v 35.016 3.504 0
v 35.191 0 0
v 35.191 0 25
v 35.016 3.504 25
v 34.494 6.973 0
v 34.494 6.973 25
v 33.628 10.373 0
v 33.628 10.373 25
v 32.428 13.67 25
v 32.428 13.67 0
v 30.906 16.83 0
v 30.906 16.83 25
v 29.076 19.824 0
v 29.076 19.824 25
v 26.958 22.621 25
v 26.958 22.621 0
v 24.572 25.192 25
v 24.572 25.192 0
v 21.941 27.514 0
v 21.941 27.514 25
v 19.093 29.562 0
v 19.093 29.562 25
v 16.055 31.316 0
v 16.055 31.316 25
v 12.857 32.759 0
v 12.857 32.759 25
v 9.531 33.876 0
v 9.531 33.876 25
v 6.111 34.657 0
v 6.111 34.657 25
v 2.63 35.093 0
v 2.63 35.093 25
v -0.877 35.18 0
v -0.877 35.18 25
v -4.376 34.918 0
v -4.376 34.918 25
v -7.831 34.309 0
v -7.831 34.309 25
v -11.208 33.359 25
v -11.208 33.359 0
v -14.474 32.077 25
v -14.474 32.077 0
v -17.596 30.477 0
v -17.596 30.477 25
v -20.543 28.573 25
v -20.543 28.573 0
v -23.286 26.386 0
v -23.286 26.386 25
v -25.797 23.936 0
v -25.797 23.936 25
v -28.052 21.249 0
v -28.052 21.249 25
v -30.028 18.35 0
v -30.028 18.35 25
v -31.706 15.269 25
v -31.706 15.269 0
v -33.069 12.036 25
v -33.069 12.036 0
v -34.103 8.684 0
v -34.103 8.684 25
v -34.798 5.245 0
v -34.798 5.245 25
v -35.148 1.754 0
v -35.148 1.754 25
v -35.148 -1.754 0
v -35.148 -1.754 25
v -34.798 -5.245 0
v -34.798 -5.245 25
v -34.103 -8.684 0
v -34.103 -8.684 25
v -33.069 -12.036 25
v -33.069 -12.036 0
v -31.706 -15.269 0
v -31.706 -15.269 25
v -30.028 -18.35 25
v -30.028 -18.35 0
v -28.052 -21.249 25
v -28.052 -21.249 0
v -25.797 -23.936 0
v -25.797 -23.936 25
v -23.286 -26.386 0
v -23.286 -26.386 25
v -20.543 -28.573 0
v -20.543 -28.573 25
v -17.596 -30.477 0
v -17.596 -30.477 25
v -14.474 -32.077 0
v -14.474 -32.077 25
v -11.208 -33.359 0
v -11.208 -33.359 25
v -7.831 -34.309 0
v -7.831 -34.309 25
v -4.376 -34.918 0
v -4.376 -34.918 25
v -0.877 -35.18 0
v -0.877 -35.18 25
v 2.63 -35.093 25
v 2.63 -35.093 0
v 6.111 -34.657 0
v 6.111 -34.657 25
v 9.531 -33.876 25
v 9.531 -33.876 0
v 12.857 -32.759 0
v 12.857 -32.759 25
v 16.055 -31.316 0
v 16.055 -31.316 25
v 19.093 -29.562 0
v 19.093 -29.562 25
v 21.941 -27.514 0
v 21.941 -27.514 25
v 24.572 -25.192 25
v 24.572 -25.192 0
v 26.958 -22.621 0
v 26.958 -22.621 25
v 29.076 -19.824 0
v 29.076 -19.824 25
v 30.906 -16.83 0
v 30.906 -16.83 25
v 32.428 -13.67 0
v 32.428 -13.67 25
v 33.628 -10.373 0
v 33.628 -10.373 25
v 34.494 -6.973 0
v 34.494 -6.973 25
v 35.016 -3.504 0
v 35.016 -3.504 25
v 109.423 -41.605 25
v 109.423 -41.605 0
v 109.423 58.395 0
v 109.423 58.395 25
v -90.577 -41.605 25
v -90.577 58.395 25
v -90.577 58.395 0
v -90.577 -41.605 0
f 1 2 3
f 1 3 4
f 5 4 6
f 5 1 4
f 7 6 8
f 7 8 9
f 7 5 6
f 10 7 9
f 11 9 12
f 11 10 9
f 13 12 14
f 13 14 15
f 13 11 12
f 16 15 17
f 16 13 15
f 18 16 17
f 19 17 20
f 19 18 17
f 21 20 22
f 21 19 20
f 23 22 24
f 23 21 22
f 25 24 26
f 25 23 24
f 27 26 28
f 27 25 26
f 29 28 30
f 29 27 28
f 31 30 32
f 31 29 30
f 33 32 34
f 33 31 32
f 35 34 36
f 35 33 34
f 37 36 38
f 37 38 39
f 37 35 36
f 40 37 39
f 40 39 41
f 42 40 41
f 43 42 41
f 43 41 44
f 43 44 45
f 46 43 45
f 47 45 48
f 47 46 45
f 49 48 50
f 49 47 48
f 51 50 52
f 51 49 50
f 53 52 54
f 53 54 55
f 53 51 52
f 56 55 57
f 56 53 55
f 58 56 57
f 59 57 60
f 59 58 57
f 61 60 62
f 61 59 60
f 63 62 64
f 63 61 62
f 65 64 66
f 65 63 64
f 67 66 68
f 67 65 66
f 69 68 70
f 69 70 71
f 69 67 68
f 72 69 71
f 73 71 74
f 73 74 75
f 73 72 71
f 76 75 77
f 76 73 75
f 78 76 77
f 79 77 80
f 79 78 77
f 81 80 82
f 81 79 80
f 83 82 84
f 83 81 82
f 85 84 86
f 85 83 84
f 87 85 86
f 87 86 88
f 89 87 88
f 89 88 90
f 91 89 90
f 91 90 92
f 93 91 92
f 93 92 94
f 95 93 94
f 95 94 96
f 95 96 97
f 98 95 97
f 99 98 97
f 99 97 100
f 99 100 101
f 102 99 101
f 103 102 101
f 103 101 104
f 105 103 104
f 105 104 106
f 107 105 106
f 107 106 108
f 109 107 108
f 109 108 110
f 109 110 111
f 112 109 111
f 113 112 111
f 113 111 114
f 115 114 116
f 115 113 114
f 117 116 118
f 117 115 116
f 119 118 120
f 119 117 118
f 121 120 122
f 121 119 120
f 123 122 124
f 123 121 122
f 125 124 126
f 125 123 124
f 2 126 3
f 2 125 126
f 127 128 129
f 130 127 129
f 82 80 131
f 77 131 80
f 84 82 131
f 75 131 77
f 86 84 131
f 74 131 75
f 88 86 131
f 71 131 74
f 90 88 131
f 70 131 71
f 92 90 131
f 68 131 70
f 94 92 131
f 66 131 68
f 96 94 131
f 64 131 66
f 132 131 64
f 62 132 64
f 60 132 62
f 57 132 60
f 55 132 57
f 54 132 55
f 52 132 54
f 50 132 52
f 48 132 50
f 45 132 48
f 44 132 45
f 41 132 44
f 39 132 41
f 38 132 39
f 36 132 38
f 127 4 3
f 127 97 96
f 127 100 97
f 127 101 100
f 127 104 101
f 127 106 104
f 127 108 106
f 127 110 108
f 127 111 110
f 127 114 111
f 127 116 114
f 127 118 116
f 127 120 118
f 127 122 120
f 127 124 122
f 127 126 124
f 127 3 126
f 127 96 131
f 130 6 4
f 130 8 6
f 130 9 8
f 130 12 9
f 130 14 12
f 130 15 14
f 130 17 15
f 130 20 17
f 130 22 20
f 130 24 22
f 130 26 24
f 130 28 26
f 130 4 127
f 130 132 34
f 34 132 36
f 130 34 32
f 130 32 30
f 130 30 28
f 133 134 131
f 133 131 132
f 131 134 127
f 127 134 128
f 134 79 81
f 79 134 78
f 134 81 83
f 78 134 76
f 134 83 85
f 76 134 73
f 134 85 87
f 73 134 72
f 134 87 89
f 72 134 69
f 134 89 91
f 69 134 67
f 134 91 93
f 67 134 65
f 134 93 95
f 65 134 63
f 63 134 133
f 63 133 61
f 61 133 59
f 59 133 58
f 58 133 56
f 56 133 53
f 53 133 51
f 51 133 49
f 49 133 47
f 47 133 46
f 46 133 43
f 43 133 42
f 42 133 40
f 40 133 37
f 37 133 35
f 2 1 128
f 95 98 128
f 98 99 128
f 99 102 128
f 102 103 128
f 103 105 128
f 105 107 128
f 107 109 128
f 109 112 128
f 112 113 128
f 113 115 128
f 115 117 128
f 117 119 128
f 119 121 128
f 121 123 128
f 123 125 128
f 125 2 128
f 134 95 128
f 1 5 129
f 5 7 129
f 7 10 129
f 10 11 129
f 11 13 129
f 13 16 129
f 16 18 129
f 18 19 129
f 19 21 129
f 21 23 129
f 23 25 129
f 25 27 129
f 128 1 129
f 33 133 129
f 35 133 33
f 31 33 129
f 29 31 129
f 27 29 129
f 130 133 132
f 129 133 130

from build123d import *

# Parameters (mm, degrees)
F0_W     = 200
F0_H     = 100
F0_R     = 35.191304
F1_DEPTH = 25
F3_W     = 11.49768
F3_H     = 100
F4_DEPTH = 10
F5_W     = 11.49768
F5_H     = 100
F6_DEPTH = 10


with BuildPart() as f1:
    # F0 (on Top) → F1 (new body)
    with BuildSketch(Plane.XY):
        with Locations((9.423193, 8.395134)):
            Rectangle(F0_W, F0_H)
        Circle(F0_R, mode=Mode.SUBTRACT)
    extrude(amount=F1_DEPTH)

    # F3 (on face) → F4 (join)
    with BuildSketch(Plane.XY.offset(25)):
        with Locations((-66.680519, 8.395134)):
            Rectangle(F3_W, F3_H)
    extrude(amount=-F4_DEPTH)

    # F5 (on face) → F6 (join)
    with BuildSketch(Plane.XY.offset(25)):
        with Locations((-66.680519, 8.395134)):
            Rectangle(F5_W, F5_H)
    extrude(amount=-F6_DEPTH)


solid = f1.part
